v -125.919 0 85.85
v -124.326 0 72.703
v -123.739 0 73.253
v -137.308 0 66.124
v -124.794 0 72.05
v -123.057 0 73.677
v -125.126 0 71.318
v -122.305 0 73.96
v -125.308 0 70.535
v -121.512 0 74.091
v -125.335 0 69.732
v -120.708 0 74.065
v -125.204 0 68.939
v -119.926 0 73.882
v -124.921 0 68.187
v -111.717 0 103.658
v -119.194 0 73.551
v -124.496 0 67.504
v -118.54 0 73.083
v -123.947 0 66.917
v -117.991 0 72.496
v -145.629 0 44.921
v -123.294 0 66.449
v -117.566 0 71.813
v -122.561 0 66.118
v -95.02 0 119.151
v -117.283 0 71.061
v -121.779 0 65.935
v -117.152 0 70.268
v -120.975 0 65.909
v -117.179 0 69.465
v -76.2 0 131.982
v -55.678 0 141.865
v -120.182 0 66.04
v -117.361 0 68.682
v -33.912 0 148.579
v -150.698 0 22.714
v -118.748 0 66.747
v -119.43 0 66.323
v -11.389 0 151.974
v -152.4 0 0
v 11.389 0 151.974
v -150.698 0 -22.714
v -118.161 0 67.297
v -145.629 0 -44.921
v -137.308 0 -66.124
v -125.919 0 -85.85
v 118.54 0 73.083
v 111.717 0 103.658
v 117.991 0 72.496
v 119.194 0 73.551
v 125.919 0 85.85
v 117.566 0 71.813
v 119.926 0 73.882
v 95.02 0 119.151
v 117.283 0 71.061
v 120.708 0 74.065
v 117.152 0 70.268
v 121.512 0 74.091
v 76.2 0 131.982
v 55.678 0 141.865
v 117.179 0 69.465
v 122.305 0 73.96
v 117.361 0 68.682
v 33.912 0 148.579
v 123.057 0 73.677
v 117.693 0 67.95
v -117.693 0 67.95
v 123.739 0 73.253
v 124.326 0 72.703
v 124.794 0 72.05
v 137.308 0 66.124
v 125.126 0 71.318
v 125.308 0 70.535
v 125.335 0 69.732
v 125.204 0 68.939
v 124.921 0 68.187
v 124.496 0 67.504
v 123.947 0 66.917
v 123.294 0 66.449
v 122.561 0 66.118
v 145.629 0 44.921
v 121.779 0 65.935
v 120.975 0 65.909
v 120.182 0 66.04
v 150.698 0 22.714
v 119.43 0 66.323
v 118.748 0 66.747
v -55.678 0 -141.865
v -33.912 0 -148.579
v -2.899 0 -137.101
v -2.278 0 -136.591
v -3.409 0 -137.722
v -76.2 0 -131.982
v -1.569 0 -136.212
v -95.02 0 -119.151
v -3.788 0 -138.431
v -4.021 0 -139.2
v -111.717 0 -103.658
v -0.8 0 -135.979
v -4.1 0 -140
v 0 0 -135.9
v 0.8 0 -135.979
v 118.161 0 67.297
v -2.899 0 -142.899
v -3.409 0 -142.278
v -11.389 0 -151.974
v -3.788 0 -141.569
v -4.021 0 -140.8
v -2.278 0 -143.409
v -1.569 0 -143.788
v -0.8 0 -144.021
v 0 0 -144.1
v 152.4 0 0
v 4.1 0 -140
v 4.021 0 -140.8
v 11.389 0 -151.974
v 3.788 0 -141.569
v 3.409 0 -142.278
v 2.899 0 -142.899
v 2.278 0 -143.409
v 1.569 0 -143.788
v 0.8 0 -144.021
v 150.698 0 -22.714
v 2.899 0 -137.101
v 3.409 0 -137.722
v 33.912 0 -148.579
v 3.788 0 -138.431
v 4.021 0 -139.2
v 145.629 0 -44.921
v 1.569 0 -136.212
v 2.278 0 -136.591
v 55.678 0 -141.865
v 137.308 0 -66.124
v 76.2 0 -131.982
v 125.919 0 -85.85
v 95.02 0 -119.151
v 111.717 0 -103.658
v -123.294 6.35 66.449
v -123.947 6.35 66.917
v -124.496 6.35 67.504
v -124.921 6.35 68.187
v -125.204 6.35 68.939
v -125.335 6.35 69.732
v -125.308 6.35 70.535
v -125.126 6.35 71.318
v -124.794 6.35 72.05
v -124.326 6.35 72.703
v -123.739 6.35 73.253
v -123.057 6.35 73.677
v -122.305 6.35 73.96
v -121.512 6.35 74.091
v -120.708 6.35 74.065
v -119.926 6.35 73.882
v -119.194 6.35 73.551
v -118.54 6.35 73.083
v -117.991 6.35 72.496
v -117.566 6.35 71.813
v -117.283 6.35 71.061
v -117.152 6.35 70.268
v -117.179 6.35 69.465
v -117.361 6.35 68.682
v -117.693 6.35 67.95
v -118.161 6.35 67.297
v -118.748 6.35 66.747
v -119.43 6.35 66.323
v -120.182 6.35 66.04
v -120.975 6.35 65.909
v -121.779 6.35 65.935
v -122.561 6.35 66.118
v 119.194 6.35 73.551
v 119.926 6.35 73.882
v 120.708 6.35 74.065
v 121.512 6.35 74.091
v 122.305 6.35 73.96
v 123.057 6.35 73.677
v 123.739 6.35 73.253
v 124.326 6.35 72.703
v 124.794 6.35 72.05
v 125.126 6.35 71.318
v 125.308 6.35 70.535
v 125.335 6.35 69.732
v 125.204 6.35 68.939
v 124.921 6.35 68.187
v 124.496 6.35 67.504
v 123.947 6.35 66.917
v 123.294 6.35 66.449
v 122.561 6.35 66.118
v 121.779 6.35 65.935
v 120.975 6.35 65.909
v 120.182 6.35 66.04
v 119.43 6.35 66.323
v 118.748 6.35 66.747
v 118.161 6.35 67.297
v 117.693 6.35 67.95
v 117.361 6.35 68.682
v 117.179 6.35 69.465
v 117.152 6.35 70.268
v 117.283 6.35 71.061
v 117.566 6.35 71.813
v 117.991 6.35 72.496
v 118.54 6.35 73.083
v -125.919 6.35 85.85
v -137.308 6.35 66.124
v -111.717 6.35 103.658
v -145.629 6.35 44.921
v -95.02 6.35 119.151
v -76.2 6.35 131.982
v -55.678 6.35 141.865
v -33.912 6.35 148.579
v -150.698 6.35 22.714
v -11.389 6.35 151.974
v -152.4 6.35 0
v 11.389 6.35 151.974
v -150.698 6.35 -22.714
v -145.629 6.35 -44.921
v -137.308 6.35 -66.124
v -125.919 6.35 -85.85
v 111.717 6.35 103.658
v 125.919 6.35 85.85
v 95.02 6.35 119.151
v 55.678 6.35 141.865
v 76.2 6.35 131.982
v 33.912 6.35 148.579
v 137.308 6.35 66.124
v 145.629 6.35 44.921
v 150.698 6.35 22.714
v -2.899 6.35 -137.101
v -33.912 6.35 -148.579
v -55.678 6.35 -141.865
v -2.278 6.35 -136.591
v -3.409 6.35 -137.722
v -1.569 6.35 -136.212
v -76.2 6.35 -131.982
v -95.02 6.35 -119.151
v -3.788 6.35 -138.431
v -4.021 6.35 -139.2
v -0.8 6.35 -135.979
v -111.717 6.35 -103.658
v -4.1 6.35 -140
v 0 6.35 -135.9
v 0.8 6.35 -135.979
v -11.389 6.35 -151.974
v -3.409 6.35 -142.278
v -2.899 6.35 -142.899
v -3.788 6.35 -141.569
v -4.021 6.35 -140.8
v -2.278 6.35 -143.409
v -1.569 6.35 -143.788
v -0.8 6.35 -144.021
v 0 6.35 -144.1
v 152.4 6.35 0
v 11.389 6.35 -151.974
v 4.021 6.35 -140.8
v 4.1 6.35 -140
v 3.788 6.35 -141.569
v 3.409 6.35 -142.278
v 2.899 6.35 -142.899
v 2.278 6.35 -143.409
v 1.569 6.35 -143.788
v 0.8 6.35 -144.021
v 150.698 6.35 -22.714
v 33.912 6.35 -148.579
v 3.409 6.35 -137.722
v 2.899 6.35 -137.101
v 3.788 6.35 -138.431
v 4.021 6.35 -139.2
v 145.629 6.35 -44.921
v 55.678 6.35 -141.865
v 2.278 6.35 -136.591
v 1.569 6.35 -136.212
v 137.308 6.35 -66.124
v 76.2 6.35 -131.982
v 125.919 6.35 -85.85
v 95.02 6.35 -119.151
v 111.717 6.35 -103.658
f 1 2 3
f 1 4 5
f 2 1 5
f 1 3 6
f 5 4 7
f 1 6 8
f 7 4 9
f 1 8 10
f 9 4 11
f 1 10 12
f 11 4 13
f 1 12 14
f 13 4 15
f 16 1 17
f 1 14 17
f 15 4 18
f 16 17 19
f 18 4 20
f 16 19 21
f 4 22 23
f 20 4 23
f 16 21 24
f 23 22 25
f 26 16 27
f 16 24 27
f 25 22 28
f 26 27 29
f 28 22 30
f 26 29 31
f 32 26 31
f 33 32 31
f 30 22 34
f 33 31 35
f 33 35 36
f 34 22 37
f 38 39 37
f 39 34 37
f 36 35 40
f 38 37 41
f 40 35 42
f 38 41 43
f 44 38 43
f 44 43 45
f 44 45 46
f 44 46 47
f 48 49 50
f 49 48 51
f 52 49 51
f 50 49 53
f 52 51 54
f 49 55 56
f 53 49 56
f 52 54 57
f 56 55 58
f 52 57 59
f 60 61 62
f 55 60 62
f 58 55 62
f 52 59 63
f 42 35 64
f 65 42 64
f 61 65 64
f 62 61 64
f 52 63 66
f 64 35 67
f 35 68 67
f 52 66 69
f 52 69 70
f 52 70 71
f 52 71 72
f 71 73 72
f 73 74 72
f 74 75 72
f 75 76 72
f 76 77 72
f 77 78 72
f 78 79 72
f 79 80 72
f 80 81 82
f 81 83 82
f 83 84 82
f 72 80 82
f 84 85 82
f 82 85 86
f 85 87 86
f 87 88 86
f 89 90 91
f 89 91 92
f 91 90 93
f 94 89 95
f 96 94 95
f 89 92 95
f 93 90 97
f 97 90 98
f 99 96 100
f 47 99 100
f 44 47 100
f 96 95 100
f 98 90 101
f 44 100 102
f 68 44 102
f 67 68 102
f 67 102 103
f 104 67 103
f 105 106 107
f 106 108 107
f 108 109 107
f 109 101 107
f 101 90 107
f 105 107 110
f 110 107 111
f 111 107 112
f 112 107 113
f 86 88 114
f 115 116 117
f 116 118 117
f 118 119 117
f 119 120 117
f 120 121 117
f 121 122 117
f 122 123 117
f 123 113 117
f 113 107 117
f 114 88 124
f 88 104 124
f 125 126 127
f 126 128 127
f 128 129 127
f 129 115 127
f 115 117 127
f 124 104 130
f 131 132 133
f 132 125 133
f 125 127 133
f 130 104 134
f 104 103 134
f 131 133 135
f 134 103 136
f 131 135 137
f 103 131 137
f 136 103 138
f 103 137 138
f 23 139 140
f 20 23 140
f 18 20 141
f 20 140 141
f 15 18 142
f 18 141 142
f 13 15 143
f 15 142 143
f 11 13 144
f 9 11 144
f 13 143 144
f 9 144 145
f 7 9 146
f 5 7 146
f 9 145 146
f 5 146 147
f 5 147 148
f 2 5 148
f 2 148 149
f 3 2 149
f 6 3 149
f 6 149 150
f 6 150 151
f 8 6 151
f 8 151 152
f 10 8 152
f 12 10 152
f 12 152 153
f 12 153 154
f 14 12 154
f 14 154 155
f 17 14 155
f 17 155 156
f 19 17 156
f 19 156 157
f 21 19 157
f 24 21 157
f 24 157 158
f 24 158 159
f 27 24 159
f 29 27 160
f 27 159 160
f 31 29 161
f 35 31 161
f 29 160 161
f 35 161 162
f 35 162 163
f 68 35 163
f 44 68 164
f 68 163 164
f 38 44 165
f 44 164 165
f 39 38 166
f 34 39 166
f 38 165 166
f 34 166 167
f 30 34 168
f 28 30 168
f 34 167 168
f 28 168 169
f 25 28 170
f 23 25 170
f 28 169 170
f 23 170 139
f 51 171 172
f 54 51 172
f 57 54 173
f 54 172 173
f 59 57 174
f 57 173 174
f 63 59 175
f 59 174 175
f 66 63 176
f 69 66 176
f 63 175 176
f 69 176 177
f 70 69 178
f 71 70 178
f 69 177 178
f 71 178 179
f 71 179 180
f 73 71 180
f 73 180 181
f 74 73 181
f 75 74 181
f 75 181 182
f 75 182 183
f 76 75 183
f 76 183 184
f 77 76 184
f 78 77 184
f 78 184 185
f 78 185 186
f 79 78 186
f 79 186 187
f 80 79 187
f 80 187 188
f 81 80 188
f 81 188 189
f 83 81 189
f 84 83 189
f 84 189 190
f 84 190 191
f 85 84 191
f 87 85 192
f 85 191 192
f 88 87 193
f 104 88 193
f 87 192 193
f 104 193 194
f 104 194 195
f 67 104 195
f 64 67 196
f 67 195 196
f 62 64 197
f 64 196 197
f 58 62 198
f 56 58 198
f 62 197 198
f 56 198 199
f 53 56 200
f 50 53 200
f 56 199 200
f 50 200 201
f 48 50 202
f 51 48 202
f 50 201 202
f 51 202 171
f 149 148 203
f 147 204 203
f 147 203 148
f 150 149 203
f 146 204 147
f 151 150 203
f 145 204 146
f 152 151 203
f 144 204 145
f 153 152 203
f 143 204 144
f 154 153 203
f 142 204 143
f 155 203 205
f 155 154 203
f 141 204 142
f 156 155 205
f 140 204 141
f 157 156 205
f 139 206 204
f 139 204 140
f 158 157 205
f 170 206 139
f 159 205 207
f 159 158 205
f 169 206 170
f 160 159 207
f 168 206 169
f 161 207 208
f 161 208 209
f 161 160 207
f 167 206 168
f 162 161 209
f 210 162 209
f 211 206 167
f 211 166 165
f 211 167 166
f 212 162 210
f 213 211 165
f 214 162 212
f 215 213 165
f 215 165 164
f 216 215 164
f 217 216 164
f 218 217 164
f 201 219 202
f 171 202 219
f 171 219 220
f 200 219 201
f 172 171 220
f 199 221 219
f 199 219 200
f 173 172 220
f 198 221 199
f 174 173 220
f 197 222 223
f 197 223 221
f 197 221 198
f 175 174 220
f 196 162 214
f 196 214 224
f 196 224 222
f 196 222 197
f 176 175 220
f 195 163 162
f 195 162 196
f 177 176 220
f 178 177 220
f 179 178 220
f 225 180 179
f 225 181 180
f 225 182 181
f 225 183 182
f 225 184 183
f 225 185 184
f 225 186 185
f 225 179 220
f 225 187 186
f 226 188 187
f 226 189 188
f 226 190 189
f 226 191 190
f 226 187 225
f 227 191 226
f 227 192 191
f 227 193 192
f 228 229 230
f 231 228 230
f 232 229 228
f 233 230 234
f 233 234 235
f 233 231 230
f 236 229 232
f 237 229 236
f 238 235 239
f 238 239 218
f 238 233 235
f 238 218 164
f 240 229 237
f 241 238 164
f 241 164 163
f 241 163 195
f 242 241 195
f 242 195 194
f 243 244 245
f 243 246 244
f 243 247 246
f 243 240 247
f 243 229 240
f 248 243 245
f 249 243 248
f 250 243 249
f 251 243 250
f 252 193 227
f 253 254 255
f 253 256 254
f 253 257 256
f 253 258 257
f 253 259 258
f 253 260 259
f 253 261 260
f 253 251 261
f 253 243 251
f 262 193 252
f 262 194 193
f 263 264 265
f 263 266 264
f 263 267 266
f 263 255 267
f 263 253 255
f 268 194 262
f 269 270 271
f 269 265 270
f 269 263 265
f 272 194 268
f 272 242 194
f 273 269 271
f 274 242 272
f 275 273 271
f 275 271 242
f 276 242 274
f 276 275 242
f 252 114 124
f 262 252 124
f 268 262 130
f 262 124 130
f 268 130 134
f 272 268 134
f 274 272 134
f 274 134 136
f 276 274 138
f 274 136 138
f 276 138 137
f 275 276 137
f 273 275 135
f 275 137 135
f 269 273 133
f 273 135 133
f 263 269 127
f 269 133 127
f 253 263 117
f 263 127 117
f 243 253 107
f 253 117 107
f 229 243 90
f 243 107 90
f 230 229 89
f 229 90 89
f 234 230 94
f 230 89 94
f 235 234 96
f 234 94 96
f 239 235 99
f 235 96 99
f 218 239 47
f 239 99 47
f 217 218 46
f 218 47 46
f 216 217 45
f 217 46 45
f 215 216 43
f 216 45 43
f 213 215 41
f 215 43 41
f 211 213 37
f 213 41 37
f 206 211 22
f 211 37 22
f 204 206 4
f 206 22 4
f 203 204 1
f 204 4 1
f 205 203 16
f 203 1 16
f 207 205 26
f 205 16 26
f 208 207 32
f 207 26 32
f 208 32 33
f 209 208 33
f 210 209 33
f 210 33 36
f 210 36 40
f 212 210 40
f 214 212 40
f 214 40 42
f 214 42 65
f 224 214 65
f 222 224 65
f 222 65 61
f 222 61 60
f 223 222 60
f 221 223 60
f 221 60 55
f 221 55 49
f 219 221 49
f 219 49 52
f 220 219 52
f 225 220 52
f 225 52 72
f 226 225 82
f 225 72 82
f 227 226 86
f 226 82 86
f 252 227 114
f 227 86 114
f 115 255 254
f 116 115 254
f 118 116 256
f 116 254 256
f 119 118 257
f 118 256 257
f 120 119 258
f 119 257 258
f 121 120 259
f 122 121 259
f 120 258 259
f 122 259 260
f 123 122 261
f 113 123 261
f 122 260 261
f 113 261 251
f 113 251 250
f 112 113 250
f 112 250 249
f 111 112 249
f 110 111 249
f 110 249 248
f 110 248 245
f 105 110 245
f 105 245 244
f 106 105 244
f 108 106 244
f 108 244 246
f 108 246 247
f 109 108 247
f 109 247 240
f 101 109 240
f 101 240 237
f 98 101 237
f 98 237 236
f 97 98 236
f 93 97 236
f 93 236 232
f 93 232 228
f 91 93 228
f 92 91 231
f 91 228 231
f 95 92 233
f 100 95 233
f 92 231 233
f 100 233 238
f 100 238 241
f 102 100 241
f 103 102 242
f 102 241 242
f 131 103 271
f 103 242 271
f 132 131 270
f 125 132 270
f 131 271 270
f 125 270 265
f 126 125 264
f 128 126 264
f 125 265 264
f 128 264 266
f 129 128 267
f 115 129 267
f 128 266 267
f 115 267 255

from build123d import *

# Parameters (mm, degrees)
SKETCH1_R           = 152.4
BOSS_EXTRUDE1_DEPTH = 6.35
SKETCH2_R           = 4.1
CUT_EXTRUDE1_DEPTH  = 7.35
CIRPATTERN1_COUNT   = 3


with BuildPart() as part:
    # Sketch1 → Boss-Extrude1 (new body)
    with BuildSketch(Plane(origin=(0, 0, 0), x_dir=(1, 0, 0), z_dir=(0, 1, 0))):
        Circle(SKETCH1_R)
    extrude(amount=BOSS_EXTRUDE1_DEPTH)

    # Sketch2 → Cut-Extrude1 (cut, through all)
    with BuildSketch(Plane(origin=(0, 6.35, 0), x_dir=(1, 0, 0), z_dir=(0, 1, 0))):
        with Locations((0, 140)):
            Circle(SKETCH2_R)
    cut_extrude1 = extrude(amount=-CUT_EXTRUDE1_DEPTH, mode=Mode.SUBTRACT)

    # CirPattern1: Cut-Extrude1 ×3 about axis
    cirpattern1_axis = Axis((0, 0, 0), (0, 1, 0))
    for i in range(1, CIRPATTERN1_COUNT):
        add(cut_extrude1.rotate(cirpattern1_axis, i * 360 / CIRPATTERN1_COUNT), mode=Mode.SUBTRACT)


solid = part.part
